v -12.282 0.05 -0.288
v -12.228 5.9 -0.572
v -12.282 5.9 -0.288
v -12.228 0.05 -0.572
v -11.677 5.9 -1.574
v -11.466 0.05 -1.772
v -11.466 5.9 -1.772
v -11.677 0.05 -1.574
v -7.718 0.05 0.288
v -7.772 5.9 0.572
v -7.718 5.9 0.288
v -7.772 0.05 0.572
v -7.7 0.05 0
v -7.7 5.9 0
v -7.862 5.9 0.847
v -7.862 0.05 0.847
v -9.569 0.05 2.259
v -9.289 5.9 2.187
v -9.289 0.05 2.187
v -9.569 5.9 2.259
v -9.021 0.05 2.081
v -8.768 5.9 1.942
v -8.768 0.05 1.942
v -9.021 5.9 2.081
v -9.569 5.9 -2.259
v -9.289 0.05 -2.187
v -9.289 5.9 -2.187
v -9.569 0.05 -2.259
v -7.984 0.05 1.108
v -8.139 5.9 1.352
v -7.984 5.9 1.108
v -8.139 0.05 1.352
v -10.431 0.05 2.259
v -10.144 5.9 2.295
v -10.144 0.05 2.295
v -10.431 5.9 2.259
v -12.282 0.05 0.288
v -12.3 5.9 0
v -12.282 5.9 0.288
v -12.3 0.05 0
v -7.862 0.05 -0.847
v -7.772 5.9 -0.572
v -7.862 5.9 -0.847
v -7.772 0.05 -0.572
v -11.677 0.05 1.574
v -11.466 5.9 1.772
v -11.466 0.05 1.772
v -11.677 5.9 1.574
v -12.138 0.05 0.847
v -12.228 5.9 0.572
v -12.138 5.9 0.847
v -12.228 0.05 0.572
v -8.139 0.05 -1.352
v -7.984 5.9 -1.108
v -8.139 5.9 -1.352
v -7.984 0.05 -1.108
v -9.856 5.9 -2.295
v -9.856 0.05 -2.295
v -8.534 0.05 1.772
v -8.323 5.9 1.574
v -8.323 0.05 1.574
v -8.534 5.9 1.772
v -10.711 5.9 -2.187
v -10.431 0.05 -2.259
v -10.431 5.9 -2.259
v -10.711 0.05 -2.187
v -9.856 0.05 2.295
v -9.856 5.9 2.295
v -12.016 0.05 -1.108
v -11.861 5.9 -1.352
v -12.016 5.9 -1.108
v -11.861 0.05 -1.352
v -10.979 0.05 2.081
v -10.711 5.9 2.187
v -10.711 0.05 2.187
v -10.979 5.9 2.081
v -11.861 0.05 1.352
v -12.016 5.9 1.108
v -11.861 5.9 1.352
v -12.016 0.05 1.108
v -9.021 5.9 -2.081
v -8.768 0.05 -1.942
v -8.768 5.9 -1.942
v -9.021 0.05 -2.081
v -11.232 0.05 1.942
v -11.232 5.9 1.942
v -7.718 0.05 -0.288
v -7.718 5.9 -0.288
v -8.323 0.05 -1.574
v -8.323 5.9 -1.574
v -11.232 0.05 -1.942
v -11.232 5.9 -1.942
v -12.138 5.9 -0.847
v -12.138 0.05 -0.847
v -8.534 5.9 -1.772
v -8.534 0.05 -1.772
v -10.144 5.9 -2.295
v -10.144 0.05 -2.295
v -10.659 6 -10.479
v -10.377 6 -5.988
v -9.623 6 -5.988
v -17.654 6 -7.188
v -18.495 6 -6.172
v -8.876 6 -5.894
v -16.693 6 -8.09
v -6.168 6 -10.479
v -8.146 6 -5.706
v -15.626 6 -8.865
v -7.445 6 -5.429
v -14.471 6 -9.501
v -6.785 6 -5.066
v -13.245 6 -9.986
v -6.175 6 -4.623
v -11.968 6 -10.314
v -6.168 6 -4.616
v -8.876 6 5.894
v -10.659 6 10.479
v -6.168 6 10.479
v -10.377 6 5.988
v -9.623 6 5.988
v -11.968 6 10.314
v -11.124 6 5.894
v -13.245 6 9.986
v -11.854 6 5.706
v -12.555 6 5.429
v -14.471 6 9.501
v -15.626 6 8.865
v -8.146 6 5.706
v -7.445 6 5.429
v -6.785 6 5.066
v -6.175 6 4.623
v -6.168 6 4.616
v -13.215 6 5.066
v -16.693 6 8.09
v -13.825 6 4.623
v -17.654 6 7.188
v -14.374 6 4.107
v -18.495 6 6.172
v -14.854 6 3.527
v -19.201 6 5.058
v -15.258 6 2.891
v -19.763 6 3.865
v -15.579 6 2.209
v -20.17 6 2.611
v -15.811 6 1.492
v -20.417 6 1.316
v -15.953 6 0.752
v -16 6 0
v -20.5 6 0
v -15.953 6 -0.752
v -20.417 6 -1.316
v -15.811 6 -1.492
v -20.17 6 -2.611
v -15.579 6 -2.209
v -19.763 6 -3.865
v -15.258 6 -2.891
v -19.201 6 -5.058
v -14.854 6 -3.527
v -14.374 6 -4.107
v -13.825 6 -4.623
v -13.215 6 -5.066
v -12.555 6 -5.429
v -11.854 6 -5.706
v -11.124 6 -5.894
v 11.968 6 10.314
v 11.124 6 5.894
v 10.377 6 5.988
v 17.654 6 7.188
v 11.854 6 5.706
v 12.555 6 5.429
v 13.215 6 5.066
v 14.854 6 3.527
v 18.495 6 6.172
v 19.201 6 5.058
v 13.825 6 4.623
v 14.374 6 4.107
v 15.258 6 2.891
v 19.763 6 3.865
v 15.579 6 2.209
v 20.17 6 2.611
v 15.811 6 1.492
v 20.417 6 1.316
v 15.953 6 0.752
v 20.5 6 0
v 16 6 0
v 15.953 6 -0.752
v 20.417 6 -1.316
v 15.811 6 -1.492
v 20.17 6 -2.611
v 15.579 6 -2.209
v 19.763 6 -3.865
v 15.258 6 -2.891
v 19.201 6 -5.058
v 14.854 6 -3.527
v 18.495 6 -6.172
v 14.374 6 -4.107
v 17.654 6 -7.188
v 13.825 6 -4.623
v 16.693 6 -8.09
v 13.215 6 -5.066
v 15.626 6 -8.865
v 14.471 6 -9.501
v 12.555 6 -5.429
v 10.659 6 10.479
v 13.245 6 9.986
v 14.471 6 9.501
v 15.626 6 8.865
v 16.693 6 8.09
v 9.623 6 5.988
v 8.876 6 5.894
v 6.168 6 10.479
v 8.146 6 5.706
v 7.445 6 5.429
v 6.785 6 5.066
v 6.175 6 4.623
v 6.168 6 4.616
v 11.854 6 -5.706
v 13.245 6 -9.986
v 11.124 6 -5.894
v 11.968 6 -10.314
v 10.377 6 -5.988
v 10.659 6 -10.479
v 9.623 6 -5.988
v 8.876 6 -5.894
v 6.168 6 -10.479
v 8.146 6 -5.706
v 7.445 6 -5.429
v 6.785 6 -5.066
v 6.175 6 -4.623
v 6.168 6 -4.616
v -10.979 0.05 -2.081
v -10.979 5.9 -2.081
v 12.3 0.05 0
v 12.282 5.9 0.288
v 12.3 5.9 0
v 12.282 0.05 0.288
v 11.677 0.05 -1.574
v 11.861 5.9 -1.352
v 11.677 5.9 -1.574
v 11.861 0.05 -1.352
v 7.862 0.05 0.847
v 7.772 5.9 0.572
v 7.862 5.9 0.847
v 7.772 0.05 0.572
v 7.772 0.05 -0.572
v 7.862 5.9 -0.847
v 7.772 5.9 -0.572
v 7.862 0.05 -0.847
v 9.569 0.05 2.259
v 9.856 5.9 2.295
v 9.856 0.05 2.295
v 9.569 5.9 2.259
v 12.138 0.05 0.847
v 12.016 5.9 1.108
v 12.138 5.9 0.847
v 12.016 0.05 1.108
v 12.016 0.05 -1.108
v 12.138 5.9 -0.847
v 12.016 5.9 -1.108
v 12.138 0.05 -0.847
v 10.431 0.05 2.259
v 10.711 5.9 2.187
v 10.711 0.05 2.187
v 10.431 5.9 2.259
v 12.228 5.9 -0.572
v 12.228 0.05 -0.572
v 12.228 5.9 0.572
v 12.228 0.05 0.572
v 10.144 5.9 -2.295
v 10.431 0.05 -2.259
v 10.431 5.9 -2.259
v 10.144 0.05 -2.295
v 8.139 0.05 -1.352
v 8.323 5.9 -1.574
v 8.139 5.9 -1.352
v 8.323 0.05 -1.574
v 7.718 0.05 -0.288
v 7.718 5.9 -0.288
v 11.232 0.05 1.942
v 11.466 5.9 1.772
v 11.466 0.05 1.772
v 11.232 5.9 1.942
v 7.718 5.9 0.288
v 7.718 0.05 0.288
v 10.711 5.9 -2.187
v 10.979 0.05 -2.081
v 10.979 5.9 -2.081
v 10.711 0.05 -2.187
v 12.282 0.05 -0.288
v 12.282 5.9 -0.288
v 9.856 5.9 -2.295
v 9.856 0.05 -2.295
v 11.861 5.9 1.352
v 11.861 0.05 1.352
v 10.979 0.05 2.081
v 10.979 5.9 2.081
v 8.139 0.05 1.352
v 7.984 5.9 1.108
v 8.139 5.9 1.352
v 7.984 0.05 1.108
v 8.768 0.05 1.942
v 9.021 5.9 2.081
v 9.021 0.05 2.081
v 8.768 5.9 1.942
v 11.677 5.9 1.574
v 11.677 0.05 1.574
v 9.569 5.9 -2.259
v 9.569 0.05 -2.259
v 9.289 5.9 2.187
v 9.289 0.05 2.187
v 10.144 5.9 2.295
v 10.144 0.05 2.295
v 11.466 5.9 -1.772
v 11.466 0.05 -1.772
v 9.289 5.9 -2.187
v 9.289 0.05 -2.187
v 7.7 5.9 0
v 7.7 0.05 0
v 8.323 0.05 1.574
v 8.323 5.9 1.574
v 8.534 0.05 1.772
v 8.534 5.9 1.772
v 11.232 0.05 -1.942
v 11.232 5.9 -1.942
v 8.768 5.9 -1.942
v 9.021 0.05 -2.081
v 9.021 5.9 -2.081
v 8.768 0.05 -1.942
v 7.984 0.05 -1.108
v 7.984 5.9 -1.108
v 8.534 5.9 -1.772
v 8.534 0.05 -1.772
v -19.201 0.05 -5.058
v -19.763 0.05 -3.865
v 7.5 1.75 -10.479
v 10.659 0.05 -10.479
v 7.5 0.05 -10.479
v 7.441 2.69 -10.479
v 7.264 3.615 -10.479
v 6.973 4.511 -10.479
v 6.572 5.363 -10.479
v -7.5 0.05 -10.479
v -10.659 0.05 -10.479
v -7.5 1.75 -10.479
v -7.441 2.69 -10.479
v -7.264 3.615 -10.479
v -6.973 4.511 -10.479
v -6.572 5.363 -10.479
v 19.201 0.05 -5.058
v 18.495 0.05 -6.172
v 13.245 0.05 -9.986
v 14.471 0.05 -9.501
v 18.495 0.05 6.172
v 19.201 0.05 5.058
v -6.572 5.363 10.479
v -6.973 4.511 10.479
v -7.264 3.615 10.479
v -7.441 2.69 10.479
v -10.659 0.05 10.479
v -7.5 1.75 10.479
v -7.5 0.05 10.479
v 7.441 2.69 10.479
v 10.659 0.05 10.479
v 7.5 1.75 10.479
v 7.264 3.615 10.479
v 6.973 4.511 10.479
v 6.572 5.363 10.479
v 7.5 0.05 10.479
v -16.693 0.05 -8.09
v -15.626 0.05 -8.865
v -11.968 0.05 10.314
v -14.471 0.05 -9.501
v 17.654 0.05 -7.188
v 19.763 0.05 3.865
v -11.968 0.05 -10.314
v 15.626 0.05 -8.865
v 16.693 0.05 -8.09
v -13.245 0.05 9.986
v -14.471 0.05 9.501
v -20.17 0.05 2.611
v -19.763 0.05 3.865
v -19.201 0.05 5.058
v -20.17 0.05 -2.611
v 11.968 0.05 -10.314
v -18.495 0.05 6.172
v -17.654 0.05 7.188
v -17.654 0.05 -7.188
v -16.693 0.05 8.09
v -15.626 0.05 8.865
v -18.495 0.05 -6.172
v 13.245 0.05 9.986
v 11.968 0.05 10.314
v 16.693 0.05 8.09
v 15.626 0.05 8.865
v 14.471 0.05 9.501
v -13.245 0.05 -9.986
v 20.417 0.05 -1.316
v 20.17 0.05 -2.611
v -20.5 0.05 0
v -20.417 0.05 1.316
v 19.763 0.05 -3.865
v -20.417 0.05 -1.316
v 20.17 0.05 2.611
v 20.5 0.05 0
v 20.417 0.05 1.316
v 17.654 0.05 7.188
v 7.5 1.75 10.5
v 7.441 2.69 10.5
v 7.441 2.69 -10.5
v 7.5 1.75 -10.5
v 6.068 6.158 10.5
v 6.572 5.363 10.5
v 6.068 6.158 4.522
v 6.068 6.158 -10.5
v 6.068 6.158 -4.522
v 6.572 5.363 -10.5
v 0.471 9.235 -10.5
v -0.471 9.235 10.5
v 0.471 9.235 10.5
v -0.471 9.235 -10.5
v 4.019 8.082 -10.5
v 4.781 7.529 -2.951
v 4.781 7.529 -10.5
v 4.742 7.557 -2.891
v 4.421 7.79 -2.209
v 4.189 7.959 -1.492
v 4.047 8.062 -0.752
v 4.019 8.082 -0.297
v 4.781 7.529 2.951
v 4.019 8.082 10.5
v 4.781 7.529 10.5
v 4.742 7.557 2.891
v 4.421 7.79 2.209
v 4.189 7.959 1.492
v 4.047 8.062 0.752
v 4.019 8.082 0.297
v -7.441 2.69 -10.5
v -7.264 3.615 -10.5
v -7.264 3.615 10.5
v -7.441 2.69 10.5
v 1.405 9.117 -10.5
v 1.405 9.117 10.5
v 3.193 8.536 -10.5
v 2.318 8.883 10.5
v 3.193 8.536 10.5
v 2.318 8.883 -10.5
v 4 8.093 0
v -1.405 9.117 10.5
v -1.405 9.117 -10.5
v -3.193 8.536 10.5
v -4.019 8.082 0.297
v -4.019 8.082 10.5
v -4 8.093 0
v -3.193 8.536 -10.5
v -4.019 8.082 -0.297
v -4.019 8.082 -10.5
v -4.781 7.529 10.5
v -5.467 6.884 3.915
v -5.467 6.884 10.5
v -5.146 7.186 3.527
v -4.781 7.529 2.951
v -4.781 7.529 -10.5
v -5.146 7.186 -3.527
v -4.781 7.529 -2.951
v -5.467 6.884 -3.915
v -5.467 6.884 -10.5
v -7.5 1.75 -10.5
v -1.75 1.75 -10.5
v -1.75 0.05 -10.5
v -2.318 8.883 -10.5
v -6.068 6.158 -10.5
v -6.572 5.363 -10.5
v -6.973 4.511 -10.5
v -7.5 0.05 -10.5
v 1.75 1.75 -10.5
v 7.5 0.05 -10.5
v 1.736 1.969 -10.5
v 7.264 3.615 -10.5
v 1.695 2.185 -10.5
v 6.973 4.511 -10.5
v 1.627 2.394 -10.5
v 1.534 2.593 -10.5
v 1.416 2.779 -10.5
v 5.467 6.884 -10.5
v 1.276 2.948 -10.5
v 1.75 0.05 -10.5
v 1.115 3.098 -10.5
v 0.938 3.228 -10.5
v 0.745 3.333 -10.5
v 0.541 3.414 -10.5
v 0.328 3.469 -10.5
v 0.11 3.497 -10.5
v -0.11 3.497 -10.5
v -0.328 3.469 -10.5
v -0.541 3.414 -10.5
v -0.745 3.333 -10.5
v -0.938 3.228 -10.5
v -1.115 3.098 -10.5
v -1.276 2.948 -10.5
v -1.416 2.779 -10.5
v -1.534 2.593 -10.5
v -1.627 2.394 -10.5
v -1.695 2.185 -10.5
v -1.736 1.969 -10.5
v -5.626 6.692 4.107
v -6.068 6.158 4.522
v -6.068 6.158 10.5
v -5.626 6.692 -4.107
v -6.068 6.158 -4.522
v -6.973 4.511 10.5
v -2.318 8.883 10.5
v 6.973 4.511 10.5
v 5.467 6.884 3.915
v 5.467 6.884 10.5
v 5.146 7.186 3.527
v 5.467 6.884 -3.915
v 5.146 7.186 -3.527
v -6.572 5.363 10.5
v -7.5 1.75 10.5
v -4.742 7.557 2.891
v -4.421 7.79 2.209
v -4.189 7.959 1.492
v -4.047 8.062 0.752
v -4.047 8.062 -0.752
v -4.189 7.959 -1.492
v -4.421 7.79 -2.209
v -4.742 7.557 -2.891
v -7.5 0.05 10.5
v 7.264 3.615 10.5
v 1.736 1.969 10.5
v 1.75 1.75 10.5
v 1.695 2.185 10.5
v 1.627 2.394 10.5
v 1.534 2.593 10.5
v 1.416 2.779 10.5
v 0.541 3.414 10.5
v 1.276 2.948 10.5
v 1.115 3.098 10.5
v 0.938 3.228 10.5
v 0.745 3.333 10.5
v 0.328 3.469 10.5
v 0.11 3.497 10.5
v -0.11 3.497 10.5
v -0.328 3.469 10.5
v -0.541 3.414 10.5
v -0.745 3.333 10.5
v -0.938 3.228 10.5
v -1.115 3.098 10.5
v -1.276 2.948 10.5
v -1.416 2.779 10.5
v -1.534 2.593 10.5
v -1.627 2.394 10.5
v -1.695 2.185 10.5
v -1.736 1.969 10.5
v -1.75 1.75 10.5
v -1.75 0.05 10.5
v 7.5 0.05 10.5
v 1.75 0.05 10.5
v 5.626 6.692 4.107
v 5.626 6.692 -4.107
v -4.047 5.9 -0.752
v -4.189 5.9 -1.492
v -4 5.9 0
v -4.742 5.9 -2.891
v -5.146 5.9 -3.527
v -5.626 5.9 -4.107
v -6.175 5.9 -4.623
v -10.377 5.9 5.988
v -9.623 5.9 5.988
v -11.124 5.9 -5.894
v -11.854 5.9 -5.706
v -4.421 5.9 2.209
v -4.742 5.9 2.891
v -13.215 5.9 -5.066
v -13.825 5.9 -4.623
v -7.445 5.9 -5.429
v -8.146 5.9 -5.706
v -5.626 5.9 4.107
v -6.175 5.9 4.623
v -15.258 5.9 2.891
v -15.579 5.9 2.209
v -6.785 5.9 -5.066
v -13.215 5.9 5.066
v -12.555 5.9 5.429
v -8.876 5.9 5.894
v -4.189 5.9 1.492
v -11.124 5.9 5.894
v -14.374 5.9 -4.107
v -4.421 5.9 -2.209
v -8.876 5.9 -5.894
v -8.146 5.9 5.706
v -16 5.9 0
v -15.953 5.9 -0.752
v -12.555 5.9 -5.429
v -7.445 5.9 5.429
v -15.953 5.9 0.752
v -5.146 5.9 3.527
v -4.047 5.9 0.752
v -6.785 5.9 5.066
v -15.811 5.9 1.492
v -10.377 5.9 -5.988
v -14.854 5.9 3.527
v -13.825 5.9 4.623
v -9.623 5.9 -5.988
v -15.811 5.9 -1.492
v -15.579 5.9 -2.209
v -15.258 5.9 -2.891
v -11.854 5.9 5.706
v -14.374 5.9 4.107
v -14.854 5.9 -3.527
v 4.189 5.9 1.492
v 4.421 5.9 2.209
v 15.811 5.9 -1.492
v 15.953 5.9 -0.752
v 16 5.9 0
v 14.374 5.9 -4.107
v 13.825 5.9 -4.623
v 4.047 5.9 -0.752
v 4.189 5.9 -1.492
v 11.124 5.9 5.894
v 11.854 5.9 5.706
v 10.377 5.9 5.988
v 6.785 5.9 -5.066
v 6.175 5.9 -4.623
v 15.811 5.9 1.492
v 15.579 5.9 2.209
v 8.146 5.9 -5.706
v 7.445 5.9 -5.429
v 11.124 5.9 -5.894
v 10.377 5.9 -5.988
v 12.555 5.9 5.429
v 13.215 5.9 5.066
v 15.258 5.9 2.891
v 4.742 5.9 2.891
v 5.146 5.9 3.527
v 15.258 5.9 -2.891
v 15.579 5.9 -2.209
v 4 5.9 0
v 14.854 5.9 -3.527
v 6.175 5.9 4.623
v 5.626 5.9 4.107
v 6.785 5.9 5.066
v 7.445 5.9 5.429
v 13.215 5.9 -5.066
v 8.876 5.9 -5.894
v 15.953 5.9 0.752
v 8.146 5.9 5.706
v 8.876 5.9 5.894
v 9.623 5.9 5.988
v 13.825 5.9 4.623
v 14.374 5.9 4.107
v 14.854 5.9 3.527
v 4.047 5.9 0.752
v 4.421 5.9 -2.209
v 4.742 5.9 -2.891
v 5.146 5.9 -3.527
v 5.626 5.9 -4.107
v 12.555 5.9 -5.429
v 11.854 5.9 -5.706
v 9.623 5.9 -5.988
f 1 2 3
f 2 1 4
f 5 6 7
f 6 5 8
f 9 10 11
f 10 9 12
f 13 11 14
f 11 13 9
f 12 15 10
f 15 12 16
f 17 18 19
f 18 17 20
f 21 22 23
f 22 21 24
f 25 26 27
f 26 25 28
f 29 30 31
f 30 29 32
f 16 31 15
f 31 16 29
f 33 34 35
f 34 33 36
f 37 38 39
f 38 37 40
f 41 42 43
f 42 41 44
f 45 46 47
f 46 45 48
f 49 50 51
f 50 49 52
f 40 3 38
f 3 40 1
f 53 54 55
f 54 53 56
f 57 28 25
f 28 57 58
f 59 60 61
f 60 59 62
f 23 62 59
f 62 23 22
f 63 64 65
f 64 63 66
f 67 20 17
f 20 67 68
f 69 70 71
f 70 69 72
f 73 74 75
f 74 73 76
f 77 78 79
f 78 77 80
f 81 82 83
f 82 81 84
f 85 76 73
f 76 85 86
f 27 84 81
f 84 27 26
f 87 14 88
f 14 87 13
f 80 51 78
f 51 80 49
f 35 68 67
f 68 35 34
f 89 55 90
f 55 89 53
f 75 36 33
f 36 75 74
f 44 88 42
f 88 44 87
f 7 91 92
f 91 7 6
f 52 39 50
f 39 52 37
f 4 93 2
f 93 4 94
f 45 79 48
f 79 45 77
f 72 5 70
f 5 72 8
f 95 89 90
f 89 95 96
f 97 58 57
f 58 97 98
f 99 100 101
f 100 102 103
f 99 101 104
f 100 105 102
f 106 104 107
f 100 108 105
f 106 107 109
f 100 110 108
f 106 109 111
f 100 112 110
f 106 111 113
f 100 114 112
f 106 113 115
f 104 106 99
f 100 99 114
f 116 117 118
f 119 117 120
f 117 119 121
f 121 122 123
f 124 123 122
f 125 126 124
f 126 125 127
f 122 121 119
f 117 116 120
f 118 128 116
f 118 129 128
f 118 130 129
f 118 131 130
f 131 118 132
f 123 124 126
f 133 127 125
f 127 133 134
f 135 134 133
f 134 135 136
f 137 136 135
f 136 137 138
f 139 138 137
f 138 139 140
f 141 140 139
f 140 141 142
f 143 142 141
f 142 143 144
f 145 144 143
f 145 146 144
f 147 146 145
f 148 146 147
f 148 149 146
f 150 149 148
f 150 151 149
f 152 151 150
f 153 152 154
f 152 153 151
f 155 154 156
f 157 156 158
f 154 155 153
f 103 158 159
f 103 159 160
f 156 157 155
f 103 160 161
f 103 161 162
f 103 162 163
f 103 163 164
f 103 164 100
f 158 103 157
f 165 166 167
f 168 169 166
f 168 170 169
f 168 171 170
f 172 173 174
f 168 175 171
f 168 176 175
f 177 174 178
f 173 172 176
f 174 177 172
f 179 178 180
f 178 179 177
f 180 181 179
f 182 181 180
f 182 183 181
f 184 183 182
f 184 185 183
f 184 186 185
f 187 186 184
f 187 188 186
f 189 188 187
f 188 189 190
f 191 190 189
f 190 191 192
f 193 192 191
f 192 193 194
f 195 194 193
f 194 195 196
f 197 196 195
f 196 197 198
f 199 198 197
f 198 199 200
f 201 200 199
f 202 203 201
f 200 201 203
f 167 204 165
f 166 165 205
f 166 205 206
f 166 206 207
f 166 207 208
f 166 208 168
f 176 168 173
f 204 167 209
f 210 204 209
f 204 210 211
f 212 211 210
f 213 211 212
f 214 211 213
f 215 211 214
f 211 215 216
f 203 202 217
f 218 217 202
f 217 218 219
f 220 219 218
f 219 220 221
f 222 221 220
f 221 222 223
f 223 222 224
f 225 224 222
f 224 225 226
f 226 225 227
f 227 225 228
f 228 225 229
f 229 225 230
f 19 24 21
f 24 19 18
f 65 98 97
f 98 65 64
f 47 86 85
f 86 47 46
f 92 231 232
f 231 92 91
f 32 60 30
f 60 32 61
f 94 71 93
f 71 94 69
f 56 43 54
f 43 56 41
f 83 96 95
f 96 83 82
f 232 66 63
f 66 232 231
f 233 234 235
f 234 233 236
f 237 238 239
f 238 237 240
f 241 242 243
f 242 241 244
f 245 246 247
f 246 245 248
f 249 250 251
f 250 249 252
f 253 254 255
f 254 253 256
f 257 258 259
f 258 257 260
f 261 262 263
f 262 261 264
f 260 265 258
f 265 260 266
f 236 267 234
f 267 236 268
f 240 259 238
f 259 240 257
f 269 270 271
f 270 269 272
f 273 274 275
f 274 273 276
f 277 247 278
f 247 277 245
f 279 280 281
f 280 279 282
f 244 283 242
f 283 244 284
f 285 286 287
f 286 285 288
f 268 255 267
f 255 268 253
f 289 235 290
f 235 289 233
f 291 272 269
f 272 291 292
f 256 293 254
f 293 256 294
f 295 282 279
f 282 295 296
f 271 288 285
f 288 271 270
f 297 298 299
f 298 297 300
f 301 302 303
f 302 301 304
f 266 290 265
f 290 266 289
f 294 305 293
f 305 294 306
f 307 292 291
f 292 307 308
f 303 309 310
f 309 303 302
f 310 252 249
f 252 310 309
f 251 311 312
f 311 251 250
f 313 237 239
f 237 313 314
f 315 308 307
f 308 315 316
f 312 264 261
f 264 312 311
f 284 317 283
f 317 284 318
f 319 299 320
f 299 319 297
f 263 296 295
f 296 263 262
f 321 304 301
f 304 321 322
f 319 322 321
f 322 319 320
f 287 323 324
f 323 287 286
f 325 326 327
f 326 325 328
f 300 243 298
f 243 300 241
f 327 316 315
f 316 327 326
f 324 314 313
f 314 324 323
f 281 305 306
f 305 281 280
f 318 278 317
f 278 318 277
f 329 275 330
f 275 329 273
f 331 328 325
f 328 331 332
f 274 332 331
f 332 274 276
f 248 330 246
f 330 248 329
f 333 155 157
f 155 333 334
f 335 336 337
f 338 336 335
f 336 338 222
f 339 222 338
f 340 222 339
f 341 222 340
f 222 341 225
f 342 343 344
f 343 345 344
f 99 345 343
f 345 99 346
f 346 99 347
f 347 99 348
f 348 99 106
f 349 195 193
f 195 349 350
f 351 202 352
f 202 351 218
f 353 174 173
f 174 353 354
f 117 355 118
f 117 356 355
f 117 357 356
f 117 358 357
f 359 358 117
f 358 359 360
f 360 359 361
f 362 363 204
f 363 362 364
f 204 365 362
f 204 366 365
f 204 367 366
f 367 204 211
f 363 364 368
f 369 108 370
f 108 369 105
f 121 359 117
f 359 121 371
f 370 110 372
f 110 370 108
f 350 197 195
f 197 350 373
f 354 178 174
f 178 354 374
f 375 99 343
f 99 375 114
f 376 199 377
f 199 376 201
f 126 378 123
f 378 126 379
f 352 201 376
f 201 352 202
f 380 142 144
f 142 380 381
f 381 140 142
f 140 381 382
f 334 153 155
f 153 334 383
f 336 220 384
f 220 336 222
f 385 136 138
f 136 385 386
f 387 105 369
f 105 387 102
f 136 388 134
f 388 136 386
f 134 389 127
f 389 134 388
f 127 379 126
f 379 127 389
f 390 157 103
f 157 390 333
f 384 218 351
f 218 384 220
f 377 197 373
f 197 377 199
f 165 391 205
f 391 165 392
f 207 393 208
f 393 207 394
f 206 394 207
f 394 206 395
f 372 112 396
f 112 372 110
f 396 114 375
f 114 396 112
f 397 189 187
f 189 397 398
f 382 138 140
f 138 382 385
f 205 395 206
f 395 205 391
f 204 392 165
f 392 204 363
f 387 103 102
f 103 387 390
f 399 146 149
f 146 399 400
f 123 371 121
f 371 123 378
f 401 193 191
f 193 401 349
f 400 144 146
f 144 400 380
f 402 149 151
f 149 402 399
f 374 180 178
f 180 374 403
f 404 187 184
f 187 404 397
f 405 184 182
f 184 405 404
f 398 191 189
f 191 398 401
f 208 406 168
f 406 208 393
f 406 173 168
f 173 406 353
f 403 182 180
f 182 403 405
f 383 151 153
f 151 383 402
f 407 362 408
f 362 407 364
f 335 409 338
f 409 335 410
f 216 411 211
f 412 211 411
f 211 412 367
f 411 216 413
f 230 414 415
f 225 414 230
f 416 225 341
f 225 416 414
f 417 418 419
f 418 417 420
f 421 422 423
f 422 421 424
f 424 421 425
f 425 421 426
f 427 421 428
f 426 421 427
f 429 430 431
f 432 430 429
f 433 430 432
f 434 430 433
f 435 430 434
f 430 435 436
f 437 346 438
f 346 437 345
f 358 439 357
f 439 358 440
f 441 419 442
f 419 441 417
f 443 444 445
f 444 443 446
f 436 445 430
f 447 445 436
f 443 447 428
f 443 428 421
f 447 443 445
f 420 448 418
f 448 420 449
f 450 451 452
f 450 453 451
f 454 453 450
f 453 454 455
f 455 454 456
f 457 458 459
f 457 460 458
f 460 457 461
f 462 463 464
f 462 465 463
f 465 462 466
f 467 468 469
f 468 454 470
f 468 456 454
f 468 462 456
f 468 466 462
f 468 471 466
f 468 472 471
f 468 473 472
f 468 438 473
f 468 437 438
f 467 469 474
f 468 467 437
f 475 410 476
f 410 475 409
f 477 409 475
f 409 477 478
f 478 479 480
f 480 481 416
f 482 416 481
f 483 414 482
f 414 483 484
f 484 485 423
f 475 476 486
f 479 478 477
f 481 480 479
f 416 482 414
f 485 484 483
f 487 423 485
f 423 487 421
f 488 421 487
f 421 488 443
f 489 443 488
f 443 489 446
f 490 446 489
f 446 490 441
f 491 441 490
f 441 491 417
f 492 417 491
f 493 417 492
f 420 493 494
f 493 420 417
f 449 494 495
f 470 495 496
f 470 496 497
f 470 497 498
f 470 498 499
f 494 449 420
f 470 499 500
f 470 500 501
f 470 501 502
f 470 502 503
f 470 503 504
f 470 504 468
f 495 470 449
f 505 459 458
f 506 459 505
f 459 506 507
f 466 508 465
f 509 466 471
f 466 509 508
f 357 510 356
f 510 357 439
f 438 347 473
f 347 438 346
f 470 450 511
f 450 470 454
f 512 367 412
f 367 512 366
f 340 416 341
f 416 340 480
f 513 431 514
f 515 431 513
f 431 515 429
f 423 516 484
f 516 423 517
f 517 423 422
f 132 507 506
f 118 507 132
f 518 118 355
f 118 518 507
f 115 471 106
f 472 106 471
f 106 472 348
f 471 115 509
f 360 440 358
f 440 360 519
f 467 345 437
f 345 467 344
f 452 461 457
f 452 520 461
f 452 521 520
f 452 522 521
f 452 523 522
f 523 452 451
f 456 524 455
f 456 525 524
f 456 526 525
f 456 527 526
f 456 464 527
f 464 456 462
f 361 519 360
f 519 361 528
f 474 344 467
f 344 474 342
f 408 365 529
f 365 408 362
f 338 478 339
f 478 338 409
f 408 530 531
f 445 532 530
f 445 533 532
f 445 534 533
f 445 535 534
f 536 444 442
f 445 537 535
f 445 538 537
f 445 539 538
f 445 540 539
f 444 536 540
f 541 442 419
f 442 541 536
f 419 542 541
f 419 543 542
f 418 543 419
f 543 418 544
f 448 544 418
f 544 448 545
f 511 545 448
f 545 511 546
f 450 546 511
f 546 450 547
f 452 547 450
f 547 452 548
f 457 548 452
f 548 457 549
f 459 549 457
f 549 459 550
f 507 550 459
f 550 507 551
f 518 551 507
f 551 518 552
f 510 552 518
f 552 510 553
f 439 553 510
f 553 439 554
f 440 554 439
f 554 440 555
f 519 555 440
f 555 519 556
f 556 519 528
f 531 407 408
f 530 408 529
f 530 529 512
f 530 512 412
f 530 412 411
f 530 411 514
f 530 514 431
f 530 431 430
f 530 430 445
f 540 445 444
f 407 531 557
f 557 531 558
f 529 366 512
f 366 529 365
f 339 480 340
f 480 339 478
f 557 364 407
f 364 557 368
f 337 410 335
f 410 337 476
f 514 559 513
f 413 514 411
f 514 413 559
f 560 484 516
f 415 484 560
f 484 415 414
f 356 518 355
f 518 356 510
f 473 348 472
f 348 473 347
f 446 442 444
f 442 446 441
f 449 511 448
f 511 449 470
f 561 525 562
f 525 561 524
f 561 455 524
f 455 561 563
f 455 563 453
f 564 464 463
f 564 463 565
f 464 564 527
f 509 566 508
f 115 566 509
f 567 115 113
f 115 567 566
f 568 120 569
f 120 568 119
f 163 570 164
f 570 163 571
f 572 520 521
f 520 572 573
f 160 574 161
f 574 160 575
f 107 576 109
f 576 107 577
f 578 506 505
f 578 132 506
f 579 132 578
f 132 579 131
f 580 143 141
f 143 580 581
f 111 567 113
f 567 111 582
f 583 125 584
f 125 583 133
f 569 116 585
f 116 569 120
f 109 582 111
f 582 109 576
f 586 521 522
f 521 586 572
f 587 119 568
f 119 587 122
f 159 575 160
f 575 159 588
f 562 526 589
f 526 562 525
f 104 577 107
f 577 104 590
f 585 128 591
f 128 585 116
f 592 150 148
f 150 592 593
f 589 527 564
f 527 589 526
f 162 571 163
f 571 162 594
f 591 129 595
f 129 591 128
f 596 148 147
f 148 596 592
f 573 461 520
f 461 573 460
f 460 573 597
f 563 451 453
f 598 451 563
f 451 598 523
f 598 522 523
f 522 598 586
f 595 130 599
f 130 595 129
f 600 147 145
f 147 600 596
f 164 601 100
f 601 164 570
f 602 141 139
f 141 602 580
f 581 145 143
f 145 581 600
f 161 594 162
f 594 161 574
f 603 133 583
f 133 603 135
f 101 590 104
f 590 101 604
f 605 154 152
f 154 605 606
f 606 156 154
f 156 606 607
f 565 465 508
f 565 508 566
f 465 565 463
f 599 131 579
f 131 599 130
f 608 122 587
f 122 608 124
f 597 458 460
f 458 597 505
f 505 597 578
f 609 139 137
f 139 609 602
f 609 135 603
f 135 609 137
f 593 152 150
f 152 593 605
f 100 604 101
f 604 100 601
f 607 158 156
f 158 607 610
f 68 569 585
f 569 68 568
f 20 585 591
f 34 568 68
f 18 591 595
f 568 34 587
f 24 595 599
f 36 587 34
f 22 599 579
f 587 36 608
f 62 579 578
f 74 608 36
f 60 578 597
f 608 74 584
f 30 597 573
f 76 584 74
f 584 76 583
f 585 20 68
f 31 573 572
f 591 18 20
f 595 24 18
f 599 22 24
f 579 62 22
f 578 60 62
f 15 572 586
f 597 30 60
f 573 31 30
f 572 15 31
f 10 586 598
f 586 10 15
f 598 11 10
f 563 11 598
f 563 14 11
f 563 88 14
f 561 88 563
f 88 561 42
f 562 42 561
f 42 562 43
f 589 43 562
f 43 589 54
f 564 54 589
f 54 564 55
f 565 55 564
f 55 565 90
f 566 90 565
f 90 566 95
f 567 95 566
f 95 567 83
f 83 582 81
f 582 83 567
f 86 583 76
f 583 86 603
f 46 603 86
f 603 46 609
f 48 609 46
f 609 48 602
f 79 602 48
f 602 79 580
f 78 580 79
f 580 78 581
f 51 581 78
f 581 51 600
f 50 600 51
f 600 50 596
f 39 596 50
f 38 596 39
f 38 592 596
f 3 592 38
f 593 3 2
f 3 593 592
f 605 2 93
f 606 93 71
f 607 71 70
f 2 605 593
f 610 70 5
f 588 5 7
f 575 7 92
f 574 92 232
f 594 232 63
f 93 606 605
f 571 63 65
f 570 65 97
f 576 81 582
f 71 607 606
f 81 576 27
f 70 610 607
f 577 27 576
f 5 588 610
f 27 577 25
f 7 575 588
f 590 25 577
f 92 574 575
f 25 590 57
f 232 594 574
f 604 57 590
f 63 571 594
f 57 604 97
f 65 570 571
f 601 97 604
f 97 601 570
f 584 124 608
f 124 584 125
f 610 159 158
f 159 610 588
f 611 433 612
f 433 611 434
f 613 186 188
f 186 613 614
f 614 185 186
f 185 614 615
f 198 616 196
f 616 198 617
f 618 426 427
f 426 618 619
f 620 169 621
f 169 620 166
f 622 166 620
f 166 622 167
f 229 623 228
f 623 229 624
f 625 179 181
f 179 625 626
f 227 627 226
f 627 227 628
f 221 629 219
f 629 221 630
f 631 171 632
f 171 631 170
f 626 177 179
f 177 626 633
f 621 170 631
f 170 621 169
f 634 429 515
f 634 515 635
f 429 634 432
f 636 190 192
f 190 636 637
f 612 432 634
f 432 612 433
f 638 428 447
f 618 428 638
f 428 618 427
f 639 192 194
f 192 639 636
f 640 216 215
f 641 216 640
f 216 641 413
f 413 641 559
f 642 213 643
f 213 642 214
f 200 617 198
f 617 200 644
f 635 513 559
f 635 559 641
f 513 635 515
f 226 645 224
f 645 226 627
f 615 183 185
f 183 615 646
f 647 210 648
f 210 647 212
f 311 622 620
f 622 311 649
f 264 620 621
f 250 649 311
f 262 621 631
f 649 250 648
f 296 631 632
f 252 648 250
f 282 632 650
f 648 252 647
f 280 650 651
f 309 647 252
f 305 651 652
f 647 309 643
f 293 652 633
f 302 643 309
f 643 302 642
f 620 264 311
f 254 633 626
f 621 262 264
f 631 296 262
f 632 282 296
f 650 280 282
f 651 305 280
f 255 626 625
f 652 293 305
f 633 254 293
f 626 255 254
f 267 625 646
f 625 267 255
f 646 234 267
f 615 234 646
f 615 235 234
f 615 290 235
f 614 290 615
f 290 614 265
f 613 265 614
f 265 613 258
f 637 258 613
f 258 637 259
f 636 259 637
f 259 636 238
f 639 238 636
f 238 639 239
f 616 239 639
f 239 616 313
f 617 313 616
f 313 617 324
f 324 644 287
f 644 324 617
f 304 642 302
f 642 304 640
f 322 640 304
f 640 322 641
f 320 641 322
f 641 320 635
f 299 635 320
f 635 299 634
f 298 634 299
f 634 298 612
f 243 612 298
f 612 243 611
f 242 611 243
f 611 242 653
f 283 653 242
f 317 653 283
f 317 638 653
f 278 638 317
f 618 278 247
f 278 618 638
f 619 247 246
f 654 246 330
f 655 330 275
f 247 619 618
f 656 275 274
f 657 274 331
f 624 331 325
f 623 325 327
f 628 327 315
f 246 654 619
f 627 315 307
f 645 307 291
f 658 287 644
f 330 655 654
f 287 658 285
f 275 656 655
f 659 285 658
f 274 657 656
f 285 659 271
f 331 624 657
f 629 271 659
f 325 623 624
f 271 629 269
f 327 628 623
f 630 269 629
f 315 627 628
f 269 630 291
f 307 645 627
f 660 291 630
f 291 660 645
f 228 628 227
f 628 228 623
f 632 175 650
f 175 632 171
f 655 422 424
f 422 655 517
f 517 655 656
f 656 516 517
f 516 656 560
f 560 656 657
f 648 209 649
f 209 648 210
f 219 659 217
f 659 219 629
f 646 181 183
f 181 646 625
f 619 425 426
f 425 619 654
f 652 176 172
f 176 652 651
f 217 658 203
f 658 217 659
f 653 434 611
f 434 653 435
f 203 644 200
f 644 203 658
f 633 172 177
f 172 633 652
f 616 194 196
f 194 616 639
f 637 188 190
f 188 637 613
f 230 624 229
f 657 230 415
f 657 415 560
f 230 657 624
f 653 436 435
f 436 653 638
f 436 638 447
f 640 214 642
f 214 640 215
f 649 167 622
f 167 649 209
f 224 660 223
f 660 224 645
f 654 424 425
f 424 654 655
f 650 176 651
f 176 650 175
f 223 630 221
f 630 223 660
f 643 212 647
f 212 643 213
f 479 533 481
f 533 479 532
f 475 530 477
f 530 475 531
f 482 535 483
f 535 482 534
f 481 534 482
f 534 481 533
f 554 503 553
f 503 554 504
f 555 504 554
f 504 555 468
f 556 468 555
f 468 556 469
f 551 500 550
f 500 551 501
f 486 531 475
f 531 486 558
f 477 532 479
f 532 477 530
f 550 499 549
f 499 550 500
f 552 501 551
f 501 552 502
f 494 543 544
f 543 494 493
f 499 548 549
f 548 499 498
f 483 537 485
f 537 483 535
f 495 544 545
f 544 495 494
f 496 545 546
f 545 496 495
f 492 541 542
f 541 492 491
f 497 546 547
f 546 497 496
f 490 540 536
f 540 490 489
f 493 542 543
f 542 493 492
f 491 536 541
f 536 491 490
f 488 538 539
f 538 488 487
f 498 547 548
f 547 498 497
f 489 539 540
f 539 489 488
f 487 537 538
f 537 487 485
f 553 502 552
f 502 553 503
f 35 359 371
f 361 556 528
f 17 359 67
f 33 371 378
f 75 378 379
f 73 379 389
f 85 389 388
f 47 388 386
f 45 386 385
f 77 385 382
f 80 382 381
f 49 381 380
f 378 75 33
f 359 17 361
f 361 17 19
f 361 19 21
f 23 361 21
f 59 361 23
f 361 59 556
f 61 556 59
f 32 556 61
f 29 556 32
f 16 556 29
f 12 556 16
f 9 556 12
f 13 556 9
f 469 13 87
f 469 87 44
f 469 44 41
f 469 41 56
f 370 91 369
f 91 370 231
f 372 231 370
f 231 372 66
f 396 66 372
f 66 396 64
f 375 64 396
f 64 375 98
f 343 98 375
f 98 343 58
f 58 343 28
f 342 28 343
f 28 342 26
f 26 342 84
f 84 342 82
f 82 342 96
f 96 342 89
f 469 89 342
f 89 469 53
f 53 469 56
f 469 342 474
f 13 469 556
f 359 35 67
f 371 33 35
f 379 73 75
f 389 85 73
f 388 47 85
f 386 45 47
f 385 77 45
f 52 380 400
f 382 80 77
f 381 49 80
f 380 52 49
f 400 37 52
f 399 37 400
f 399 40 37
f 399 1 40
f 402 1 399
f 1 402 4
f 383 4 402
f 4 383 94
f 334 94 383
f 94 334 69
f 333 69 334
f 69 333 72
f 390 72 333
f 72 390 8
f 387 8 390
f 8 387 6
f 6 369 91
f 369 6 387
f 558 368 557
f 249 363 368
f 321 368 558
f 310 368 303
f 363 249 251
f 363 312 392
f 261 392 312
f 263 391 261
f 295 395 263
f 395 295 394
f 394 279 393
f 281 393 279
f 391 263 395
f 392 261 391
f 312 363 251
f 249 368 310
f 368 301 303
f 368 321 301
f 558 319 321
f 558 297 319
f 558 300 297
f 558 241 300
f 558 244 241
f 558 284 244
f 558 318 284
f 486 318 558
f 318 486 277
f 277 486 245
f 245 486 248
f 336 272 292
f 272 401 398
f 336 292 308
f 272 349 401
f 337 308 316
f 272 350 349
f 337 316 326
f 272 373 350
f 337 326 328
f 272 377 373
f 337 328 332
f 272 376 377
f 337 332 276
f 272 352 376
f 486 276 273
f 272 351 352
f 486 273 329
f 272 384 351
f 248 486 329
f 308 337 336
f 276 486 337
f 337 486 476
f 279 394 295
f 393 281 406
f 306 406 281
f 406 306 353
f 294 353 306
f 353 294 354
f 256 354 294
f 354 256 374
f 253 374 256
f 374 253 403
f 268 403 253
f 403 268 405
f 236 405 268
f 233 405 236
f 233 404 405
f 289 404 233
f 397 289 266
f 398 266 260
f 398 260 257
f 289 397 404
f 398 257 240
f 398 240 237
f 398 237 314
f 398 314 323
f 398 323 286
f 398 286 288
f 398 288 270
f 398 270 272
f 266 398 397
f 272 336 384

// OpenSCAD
/*
*   D Ring mounting bracket.
*   CudaTox, http://cudatox.ca/l/
*   @cudatox
*
*   Feb 17, 2017
*
*   A simple, procedural mounting bracket that can be used to affix a D Ring to many
*   different surfaces. 
*
*   This software and 3D model(s) are experimental and are provided for educational 
*   purposes only. 
*
*   Use of this software, any of its derivatives, or use of any of the models or 
*   parts provided with or created using this software is done at your own risk. 
*
*   DO NOT use this part for securing loads. DO NOT use this part in applications 
*   that may result in property damage, injury or death. NOT FOR CLIMBING USE.
*
*/


OD = 15;                        //Diameter of the outer cylindrical part of the bracket.
                                //This should be larger than ID

ID = 3.5;                       //Inner diameter of the bracket

length = 21;                    //width of the bracket, this should be smaller 
                                //than the width of the D ring.
                                
thickness = 6;                  //Thickness of the flat parts of the bracket

drill_centers = 20;             //Distance between the mounting holes

drill_dia = 4.6;                //Diameter of the mounting holes

head_dia = 12;                  //Cutaway for the head of the screw or washer. Zero to disable.

head_inset = 0.1;               //Inset distance for the head of the screw, 
                                //if head cutaway enabled.

$fn = 50;                       //Resolution

difference(){
    
    union(){
        hull(){
            translate([0,ID/2,0])
                cylinder(length, OD/2, OD/2,  true);
            translate([0,-ID/2,0])
                cylinder(length, OD/2, OD/2,  true);
        }
        rotate([90,0,0])
            difference(){

                hull(){
                    translate([-drill_centers/2,0,0])
                        cylinder(thickness * 2, length/2, length/2, true);
                    translate([drill_centers/2,0,0])
                        cylinder(thickness * 2, length/2, length/2, true);
                }
                
                union(){
                    translate([-drill_centers/2,0,0])
                        cylinder(thickness * 2, drill_dia/2, drill_dia/2, true);
                    translate([drill_centers/2,0,0])
                        cylinder(thickness * 2, drill_dia/2, drill_dia/2, true);
                }
            }
    }
    
    union(){
        //Cuts with a small factor added to avoid manifold issues.
        hull(){
        translate([0,ID/2,0])
            cylinder(length + 0.1, ID/2, ID/2, true);
        translate([0,-ID/2,0])
            cylinder(length + 0.1, ID/2, ID/2, true);
        }
        
        rotate([-90,0,0]) translate([0,0,thickness-head_inset])
        if (head_dia > 0){
            translate([-drill_centers/2,0,0])
                cylinder(thickness * 2, head_dia/2, head_dia/2, false);
            translate([drill_centers/2,0,0])
                cylinder(thickness * 2, head_dia/2, head_dia/2, false);
        }
        
        translate([0,-max(OD, thickness)/2,0])
            cube([drill_centers + 2 * length, max(OD, thickness) + 0.1, length + 0.1], true);
    }
    
}
